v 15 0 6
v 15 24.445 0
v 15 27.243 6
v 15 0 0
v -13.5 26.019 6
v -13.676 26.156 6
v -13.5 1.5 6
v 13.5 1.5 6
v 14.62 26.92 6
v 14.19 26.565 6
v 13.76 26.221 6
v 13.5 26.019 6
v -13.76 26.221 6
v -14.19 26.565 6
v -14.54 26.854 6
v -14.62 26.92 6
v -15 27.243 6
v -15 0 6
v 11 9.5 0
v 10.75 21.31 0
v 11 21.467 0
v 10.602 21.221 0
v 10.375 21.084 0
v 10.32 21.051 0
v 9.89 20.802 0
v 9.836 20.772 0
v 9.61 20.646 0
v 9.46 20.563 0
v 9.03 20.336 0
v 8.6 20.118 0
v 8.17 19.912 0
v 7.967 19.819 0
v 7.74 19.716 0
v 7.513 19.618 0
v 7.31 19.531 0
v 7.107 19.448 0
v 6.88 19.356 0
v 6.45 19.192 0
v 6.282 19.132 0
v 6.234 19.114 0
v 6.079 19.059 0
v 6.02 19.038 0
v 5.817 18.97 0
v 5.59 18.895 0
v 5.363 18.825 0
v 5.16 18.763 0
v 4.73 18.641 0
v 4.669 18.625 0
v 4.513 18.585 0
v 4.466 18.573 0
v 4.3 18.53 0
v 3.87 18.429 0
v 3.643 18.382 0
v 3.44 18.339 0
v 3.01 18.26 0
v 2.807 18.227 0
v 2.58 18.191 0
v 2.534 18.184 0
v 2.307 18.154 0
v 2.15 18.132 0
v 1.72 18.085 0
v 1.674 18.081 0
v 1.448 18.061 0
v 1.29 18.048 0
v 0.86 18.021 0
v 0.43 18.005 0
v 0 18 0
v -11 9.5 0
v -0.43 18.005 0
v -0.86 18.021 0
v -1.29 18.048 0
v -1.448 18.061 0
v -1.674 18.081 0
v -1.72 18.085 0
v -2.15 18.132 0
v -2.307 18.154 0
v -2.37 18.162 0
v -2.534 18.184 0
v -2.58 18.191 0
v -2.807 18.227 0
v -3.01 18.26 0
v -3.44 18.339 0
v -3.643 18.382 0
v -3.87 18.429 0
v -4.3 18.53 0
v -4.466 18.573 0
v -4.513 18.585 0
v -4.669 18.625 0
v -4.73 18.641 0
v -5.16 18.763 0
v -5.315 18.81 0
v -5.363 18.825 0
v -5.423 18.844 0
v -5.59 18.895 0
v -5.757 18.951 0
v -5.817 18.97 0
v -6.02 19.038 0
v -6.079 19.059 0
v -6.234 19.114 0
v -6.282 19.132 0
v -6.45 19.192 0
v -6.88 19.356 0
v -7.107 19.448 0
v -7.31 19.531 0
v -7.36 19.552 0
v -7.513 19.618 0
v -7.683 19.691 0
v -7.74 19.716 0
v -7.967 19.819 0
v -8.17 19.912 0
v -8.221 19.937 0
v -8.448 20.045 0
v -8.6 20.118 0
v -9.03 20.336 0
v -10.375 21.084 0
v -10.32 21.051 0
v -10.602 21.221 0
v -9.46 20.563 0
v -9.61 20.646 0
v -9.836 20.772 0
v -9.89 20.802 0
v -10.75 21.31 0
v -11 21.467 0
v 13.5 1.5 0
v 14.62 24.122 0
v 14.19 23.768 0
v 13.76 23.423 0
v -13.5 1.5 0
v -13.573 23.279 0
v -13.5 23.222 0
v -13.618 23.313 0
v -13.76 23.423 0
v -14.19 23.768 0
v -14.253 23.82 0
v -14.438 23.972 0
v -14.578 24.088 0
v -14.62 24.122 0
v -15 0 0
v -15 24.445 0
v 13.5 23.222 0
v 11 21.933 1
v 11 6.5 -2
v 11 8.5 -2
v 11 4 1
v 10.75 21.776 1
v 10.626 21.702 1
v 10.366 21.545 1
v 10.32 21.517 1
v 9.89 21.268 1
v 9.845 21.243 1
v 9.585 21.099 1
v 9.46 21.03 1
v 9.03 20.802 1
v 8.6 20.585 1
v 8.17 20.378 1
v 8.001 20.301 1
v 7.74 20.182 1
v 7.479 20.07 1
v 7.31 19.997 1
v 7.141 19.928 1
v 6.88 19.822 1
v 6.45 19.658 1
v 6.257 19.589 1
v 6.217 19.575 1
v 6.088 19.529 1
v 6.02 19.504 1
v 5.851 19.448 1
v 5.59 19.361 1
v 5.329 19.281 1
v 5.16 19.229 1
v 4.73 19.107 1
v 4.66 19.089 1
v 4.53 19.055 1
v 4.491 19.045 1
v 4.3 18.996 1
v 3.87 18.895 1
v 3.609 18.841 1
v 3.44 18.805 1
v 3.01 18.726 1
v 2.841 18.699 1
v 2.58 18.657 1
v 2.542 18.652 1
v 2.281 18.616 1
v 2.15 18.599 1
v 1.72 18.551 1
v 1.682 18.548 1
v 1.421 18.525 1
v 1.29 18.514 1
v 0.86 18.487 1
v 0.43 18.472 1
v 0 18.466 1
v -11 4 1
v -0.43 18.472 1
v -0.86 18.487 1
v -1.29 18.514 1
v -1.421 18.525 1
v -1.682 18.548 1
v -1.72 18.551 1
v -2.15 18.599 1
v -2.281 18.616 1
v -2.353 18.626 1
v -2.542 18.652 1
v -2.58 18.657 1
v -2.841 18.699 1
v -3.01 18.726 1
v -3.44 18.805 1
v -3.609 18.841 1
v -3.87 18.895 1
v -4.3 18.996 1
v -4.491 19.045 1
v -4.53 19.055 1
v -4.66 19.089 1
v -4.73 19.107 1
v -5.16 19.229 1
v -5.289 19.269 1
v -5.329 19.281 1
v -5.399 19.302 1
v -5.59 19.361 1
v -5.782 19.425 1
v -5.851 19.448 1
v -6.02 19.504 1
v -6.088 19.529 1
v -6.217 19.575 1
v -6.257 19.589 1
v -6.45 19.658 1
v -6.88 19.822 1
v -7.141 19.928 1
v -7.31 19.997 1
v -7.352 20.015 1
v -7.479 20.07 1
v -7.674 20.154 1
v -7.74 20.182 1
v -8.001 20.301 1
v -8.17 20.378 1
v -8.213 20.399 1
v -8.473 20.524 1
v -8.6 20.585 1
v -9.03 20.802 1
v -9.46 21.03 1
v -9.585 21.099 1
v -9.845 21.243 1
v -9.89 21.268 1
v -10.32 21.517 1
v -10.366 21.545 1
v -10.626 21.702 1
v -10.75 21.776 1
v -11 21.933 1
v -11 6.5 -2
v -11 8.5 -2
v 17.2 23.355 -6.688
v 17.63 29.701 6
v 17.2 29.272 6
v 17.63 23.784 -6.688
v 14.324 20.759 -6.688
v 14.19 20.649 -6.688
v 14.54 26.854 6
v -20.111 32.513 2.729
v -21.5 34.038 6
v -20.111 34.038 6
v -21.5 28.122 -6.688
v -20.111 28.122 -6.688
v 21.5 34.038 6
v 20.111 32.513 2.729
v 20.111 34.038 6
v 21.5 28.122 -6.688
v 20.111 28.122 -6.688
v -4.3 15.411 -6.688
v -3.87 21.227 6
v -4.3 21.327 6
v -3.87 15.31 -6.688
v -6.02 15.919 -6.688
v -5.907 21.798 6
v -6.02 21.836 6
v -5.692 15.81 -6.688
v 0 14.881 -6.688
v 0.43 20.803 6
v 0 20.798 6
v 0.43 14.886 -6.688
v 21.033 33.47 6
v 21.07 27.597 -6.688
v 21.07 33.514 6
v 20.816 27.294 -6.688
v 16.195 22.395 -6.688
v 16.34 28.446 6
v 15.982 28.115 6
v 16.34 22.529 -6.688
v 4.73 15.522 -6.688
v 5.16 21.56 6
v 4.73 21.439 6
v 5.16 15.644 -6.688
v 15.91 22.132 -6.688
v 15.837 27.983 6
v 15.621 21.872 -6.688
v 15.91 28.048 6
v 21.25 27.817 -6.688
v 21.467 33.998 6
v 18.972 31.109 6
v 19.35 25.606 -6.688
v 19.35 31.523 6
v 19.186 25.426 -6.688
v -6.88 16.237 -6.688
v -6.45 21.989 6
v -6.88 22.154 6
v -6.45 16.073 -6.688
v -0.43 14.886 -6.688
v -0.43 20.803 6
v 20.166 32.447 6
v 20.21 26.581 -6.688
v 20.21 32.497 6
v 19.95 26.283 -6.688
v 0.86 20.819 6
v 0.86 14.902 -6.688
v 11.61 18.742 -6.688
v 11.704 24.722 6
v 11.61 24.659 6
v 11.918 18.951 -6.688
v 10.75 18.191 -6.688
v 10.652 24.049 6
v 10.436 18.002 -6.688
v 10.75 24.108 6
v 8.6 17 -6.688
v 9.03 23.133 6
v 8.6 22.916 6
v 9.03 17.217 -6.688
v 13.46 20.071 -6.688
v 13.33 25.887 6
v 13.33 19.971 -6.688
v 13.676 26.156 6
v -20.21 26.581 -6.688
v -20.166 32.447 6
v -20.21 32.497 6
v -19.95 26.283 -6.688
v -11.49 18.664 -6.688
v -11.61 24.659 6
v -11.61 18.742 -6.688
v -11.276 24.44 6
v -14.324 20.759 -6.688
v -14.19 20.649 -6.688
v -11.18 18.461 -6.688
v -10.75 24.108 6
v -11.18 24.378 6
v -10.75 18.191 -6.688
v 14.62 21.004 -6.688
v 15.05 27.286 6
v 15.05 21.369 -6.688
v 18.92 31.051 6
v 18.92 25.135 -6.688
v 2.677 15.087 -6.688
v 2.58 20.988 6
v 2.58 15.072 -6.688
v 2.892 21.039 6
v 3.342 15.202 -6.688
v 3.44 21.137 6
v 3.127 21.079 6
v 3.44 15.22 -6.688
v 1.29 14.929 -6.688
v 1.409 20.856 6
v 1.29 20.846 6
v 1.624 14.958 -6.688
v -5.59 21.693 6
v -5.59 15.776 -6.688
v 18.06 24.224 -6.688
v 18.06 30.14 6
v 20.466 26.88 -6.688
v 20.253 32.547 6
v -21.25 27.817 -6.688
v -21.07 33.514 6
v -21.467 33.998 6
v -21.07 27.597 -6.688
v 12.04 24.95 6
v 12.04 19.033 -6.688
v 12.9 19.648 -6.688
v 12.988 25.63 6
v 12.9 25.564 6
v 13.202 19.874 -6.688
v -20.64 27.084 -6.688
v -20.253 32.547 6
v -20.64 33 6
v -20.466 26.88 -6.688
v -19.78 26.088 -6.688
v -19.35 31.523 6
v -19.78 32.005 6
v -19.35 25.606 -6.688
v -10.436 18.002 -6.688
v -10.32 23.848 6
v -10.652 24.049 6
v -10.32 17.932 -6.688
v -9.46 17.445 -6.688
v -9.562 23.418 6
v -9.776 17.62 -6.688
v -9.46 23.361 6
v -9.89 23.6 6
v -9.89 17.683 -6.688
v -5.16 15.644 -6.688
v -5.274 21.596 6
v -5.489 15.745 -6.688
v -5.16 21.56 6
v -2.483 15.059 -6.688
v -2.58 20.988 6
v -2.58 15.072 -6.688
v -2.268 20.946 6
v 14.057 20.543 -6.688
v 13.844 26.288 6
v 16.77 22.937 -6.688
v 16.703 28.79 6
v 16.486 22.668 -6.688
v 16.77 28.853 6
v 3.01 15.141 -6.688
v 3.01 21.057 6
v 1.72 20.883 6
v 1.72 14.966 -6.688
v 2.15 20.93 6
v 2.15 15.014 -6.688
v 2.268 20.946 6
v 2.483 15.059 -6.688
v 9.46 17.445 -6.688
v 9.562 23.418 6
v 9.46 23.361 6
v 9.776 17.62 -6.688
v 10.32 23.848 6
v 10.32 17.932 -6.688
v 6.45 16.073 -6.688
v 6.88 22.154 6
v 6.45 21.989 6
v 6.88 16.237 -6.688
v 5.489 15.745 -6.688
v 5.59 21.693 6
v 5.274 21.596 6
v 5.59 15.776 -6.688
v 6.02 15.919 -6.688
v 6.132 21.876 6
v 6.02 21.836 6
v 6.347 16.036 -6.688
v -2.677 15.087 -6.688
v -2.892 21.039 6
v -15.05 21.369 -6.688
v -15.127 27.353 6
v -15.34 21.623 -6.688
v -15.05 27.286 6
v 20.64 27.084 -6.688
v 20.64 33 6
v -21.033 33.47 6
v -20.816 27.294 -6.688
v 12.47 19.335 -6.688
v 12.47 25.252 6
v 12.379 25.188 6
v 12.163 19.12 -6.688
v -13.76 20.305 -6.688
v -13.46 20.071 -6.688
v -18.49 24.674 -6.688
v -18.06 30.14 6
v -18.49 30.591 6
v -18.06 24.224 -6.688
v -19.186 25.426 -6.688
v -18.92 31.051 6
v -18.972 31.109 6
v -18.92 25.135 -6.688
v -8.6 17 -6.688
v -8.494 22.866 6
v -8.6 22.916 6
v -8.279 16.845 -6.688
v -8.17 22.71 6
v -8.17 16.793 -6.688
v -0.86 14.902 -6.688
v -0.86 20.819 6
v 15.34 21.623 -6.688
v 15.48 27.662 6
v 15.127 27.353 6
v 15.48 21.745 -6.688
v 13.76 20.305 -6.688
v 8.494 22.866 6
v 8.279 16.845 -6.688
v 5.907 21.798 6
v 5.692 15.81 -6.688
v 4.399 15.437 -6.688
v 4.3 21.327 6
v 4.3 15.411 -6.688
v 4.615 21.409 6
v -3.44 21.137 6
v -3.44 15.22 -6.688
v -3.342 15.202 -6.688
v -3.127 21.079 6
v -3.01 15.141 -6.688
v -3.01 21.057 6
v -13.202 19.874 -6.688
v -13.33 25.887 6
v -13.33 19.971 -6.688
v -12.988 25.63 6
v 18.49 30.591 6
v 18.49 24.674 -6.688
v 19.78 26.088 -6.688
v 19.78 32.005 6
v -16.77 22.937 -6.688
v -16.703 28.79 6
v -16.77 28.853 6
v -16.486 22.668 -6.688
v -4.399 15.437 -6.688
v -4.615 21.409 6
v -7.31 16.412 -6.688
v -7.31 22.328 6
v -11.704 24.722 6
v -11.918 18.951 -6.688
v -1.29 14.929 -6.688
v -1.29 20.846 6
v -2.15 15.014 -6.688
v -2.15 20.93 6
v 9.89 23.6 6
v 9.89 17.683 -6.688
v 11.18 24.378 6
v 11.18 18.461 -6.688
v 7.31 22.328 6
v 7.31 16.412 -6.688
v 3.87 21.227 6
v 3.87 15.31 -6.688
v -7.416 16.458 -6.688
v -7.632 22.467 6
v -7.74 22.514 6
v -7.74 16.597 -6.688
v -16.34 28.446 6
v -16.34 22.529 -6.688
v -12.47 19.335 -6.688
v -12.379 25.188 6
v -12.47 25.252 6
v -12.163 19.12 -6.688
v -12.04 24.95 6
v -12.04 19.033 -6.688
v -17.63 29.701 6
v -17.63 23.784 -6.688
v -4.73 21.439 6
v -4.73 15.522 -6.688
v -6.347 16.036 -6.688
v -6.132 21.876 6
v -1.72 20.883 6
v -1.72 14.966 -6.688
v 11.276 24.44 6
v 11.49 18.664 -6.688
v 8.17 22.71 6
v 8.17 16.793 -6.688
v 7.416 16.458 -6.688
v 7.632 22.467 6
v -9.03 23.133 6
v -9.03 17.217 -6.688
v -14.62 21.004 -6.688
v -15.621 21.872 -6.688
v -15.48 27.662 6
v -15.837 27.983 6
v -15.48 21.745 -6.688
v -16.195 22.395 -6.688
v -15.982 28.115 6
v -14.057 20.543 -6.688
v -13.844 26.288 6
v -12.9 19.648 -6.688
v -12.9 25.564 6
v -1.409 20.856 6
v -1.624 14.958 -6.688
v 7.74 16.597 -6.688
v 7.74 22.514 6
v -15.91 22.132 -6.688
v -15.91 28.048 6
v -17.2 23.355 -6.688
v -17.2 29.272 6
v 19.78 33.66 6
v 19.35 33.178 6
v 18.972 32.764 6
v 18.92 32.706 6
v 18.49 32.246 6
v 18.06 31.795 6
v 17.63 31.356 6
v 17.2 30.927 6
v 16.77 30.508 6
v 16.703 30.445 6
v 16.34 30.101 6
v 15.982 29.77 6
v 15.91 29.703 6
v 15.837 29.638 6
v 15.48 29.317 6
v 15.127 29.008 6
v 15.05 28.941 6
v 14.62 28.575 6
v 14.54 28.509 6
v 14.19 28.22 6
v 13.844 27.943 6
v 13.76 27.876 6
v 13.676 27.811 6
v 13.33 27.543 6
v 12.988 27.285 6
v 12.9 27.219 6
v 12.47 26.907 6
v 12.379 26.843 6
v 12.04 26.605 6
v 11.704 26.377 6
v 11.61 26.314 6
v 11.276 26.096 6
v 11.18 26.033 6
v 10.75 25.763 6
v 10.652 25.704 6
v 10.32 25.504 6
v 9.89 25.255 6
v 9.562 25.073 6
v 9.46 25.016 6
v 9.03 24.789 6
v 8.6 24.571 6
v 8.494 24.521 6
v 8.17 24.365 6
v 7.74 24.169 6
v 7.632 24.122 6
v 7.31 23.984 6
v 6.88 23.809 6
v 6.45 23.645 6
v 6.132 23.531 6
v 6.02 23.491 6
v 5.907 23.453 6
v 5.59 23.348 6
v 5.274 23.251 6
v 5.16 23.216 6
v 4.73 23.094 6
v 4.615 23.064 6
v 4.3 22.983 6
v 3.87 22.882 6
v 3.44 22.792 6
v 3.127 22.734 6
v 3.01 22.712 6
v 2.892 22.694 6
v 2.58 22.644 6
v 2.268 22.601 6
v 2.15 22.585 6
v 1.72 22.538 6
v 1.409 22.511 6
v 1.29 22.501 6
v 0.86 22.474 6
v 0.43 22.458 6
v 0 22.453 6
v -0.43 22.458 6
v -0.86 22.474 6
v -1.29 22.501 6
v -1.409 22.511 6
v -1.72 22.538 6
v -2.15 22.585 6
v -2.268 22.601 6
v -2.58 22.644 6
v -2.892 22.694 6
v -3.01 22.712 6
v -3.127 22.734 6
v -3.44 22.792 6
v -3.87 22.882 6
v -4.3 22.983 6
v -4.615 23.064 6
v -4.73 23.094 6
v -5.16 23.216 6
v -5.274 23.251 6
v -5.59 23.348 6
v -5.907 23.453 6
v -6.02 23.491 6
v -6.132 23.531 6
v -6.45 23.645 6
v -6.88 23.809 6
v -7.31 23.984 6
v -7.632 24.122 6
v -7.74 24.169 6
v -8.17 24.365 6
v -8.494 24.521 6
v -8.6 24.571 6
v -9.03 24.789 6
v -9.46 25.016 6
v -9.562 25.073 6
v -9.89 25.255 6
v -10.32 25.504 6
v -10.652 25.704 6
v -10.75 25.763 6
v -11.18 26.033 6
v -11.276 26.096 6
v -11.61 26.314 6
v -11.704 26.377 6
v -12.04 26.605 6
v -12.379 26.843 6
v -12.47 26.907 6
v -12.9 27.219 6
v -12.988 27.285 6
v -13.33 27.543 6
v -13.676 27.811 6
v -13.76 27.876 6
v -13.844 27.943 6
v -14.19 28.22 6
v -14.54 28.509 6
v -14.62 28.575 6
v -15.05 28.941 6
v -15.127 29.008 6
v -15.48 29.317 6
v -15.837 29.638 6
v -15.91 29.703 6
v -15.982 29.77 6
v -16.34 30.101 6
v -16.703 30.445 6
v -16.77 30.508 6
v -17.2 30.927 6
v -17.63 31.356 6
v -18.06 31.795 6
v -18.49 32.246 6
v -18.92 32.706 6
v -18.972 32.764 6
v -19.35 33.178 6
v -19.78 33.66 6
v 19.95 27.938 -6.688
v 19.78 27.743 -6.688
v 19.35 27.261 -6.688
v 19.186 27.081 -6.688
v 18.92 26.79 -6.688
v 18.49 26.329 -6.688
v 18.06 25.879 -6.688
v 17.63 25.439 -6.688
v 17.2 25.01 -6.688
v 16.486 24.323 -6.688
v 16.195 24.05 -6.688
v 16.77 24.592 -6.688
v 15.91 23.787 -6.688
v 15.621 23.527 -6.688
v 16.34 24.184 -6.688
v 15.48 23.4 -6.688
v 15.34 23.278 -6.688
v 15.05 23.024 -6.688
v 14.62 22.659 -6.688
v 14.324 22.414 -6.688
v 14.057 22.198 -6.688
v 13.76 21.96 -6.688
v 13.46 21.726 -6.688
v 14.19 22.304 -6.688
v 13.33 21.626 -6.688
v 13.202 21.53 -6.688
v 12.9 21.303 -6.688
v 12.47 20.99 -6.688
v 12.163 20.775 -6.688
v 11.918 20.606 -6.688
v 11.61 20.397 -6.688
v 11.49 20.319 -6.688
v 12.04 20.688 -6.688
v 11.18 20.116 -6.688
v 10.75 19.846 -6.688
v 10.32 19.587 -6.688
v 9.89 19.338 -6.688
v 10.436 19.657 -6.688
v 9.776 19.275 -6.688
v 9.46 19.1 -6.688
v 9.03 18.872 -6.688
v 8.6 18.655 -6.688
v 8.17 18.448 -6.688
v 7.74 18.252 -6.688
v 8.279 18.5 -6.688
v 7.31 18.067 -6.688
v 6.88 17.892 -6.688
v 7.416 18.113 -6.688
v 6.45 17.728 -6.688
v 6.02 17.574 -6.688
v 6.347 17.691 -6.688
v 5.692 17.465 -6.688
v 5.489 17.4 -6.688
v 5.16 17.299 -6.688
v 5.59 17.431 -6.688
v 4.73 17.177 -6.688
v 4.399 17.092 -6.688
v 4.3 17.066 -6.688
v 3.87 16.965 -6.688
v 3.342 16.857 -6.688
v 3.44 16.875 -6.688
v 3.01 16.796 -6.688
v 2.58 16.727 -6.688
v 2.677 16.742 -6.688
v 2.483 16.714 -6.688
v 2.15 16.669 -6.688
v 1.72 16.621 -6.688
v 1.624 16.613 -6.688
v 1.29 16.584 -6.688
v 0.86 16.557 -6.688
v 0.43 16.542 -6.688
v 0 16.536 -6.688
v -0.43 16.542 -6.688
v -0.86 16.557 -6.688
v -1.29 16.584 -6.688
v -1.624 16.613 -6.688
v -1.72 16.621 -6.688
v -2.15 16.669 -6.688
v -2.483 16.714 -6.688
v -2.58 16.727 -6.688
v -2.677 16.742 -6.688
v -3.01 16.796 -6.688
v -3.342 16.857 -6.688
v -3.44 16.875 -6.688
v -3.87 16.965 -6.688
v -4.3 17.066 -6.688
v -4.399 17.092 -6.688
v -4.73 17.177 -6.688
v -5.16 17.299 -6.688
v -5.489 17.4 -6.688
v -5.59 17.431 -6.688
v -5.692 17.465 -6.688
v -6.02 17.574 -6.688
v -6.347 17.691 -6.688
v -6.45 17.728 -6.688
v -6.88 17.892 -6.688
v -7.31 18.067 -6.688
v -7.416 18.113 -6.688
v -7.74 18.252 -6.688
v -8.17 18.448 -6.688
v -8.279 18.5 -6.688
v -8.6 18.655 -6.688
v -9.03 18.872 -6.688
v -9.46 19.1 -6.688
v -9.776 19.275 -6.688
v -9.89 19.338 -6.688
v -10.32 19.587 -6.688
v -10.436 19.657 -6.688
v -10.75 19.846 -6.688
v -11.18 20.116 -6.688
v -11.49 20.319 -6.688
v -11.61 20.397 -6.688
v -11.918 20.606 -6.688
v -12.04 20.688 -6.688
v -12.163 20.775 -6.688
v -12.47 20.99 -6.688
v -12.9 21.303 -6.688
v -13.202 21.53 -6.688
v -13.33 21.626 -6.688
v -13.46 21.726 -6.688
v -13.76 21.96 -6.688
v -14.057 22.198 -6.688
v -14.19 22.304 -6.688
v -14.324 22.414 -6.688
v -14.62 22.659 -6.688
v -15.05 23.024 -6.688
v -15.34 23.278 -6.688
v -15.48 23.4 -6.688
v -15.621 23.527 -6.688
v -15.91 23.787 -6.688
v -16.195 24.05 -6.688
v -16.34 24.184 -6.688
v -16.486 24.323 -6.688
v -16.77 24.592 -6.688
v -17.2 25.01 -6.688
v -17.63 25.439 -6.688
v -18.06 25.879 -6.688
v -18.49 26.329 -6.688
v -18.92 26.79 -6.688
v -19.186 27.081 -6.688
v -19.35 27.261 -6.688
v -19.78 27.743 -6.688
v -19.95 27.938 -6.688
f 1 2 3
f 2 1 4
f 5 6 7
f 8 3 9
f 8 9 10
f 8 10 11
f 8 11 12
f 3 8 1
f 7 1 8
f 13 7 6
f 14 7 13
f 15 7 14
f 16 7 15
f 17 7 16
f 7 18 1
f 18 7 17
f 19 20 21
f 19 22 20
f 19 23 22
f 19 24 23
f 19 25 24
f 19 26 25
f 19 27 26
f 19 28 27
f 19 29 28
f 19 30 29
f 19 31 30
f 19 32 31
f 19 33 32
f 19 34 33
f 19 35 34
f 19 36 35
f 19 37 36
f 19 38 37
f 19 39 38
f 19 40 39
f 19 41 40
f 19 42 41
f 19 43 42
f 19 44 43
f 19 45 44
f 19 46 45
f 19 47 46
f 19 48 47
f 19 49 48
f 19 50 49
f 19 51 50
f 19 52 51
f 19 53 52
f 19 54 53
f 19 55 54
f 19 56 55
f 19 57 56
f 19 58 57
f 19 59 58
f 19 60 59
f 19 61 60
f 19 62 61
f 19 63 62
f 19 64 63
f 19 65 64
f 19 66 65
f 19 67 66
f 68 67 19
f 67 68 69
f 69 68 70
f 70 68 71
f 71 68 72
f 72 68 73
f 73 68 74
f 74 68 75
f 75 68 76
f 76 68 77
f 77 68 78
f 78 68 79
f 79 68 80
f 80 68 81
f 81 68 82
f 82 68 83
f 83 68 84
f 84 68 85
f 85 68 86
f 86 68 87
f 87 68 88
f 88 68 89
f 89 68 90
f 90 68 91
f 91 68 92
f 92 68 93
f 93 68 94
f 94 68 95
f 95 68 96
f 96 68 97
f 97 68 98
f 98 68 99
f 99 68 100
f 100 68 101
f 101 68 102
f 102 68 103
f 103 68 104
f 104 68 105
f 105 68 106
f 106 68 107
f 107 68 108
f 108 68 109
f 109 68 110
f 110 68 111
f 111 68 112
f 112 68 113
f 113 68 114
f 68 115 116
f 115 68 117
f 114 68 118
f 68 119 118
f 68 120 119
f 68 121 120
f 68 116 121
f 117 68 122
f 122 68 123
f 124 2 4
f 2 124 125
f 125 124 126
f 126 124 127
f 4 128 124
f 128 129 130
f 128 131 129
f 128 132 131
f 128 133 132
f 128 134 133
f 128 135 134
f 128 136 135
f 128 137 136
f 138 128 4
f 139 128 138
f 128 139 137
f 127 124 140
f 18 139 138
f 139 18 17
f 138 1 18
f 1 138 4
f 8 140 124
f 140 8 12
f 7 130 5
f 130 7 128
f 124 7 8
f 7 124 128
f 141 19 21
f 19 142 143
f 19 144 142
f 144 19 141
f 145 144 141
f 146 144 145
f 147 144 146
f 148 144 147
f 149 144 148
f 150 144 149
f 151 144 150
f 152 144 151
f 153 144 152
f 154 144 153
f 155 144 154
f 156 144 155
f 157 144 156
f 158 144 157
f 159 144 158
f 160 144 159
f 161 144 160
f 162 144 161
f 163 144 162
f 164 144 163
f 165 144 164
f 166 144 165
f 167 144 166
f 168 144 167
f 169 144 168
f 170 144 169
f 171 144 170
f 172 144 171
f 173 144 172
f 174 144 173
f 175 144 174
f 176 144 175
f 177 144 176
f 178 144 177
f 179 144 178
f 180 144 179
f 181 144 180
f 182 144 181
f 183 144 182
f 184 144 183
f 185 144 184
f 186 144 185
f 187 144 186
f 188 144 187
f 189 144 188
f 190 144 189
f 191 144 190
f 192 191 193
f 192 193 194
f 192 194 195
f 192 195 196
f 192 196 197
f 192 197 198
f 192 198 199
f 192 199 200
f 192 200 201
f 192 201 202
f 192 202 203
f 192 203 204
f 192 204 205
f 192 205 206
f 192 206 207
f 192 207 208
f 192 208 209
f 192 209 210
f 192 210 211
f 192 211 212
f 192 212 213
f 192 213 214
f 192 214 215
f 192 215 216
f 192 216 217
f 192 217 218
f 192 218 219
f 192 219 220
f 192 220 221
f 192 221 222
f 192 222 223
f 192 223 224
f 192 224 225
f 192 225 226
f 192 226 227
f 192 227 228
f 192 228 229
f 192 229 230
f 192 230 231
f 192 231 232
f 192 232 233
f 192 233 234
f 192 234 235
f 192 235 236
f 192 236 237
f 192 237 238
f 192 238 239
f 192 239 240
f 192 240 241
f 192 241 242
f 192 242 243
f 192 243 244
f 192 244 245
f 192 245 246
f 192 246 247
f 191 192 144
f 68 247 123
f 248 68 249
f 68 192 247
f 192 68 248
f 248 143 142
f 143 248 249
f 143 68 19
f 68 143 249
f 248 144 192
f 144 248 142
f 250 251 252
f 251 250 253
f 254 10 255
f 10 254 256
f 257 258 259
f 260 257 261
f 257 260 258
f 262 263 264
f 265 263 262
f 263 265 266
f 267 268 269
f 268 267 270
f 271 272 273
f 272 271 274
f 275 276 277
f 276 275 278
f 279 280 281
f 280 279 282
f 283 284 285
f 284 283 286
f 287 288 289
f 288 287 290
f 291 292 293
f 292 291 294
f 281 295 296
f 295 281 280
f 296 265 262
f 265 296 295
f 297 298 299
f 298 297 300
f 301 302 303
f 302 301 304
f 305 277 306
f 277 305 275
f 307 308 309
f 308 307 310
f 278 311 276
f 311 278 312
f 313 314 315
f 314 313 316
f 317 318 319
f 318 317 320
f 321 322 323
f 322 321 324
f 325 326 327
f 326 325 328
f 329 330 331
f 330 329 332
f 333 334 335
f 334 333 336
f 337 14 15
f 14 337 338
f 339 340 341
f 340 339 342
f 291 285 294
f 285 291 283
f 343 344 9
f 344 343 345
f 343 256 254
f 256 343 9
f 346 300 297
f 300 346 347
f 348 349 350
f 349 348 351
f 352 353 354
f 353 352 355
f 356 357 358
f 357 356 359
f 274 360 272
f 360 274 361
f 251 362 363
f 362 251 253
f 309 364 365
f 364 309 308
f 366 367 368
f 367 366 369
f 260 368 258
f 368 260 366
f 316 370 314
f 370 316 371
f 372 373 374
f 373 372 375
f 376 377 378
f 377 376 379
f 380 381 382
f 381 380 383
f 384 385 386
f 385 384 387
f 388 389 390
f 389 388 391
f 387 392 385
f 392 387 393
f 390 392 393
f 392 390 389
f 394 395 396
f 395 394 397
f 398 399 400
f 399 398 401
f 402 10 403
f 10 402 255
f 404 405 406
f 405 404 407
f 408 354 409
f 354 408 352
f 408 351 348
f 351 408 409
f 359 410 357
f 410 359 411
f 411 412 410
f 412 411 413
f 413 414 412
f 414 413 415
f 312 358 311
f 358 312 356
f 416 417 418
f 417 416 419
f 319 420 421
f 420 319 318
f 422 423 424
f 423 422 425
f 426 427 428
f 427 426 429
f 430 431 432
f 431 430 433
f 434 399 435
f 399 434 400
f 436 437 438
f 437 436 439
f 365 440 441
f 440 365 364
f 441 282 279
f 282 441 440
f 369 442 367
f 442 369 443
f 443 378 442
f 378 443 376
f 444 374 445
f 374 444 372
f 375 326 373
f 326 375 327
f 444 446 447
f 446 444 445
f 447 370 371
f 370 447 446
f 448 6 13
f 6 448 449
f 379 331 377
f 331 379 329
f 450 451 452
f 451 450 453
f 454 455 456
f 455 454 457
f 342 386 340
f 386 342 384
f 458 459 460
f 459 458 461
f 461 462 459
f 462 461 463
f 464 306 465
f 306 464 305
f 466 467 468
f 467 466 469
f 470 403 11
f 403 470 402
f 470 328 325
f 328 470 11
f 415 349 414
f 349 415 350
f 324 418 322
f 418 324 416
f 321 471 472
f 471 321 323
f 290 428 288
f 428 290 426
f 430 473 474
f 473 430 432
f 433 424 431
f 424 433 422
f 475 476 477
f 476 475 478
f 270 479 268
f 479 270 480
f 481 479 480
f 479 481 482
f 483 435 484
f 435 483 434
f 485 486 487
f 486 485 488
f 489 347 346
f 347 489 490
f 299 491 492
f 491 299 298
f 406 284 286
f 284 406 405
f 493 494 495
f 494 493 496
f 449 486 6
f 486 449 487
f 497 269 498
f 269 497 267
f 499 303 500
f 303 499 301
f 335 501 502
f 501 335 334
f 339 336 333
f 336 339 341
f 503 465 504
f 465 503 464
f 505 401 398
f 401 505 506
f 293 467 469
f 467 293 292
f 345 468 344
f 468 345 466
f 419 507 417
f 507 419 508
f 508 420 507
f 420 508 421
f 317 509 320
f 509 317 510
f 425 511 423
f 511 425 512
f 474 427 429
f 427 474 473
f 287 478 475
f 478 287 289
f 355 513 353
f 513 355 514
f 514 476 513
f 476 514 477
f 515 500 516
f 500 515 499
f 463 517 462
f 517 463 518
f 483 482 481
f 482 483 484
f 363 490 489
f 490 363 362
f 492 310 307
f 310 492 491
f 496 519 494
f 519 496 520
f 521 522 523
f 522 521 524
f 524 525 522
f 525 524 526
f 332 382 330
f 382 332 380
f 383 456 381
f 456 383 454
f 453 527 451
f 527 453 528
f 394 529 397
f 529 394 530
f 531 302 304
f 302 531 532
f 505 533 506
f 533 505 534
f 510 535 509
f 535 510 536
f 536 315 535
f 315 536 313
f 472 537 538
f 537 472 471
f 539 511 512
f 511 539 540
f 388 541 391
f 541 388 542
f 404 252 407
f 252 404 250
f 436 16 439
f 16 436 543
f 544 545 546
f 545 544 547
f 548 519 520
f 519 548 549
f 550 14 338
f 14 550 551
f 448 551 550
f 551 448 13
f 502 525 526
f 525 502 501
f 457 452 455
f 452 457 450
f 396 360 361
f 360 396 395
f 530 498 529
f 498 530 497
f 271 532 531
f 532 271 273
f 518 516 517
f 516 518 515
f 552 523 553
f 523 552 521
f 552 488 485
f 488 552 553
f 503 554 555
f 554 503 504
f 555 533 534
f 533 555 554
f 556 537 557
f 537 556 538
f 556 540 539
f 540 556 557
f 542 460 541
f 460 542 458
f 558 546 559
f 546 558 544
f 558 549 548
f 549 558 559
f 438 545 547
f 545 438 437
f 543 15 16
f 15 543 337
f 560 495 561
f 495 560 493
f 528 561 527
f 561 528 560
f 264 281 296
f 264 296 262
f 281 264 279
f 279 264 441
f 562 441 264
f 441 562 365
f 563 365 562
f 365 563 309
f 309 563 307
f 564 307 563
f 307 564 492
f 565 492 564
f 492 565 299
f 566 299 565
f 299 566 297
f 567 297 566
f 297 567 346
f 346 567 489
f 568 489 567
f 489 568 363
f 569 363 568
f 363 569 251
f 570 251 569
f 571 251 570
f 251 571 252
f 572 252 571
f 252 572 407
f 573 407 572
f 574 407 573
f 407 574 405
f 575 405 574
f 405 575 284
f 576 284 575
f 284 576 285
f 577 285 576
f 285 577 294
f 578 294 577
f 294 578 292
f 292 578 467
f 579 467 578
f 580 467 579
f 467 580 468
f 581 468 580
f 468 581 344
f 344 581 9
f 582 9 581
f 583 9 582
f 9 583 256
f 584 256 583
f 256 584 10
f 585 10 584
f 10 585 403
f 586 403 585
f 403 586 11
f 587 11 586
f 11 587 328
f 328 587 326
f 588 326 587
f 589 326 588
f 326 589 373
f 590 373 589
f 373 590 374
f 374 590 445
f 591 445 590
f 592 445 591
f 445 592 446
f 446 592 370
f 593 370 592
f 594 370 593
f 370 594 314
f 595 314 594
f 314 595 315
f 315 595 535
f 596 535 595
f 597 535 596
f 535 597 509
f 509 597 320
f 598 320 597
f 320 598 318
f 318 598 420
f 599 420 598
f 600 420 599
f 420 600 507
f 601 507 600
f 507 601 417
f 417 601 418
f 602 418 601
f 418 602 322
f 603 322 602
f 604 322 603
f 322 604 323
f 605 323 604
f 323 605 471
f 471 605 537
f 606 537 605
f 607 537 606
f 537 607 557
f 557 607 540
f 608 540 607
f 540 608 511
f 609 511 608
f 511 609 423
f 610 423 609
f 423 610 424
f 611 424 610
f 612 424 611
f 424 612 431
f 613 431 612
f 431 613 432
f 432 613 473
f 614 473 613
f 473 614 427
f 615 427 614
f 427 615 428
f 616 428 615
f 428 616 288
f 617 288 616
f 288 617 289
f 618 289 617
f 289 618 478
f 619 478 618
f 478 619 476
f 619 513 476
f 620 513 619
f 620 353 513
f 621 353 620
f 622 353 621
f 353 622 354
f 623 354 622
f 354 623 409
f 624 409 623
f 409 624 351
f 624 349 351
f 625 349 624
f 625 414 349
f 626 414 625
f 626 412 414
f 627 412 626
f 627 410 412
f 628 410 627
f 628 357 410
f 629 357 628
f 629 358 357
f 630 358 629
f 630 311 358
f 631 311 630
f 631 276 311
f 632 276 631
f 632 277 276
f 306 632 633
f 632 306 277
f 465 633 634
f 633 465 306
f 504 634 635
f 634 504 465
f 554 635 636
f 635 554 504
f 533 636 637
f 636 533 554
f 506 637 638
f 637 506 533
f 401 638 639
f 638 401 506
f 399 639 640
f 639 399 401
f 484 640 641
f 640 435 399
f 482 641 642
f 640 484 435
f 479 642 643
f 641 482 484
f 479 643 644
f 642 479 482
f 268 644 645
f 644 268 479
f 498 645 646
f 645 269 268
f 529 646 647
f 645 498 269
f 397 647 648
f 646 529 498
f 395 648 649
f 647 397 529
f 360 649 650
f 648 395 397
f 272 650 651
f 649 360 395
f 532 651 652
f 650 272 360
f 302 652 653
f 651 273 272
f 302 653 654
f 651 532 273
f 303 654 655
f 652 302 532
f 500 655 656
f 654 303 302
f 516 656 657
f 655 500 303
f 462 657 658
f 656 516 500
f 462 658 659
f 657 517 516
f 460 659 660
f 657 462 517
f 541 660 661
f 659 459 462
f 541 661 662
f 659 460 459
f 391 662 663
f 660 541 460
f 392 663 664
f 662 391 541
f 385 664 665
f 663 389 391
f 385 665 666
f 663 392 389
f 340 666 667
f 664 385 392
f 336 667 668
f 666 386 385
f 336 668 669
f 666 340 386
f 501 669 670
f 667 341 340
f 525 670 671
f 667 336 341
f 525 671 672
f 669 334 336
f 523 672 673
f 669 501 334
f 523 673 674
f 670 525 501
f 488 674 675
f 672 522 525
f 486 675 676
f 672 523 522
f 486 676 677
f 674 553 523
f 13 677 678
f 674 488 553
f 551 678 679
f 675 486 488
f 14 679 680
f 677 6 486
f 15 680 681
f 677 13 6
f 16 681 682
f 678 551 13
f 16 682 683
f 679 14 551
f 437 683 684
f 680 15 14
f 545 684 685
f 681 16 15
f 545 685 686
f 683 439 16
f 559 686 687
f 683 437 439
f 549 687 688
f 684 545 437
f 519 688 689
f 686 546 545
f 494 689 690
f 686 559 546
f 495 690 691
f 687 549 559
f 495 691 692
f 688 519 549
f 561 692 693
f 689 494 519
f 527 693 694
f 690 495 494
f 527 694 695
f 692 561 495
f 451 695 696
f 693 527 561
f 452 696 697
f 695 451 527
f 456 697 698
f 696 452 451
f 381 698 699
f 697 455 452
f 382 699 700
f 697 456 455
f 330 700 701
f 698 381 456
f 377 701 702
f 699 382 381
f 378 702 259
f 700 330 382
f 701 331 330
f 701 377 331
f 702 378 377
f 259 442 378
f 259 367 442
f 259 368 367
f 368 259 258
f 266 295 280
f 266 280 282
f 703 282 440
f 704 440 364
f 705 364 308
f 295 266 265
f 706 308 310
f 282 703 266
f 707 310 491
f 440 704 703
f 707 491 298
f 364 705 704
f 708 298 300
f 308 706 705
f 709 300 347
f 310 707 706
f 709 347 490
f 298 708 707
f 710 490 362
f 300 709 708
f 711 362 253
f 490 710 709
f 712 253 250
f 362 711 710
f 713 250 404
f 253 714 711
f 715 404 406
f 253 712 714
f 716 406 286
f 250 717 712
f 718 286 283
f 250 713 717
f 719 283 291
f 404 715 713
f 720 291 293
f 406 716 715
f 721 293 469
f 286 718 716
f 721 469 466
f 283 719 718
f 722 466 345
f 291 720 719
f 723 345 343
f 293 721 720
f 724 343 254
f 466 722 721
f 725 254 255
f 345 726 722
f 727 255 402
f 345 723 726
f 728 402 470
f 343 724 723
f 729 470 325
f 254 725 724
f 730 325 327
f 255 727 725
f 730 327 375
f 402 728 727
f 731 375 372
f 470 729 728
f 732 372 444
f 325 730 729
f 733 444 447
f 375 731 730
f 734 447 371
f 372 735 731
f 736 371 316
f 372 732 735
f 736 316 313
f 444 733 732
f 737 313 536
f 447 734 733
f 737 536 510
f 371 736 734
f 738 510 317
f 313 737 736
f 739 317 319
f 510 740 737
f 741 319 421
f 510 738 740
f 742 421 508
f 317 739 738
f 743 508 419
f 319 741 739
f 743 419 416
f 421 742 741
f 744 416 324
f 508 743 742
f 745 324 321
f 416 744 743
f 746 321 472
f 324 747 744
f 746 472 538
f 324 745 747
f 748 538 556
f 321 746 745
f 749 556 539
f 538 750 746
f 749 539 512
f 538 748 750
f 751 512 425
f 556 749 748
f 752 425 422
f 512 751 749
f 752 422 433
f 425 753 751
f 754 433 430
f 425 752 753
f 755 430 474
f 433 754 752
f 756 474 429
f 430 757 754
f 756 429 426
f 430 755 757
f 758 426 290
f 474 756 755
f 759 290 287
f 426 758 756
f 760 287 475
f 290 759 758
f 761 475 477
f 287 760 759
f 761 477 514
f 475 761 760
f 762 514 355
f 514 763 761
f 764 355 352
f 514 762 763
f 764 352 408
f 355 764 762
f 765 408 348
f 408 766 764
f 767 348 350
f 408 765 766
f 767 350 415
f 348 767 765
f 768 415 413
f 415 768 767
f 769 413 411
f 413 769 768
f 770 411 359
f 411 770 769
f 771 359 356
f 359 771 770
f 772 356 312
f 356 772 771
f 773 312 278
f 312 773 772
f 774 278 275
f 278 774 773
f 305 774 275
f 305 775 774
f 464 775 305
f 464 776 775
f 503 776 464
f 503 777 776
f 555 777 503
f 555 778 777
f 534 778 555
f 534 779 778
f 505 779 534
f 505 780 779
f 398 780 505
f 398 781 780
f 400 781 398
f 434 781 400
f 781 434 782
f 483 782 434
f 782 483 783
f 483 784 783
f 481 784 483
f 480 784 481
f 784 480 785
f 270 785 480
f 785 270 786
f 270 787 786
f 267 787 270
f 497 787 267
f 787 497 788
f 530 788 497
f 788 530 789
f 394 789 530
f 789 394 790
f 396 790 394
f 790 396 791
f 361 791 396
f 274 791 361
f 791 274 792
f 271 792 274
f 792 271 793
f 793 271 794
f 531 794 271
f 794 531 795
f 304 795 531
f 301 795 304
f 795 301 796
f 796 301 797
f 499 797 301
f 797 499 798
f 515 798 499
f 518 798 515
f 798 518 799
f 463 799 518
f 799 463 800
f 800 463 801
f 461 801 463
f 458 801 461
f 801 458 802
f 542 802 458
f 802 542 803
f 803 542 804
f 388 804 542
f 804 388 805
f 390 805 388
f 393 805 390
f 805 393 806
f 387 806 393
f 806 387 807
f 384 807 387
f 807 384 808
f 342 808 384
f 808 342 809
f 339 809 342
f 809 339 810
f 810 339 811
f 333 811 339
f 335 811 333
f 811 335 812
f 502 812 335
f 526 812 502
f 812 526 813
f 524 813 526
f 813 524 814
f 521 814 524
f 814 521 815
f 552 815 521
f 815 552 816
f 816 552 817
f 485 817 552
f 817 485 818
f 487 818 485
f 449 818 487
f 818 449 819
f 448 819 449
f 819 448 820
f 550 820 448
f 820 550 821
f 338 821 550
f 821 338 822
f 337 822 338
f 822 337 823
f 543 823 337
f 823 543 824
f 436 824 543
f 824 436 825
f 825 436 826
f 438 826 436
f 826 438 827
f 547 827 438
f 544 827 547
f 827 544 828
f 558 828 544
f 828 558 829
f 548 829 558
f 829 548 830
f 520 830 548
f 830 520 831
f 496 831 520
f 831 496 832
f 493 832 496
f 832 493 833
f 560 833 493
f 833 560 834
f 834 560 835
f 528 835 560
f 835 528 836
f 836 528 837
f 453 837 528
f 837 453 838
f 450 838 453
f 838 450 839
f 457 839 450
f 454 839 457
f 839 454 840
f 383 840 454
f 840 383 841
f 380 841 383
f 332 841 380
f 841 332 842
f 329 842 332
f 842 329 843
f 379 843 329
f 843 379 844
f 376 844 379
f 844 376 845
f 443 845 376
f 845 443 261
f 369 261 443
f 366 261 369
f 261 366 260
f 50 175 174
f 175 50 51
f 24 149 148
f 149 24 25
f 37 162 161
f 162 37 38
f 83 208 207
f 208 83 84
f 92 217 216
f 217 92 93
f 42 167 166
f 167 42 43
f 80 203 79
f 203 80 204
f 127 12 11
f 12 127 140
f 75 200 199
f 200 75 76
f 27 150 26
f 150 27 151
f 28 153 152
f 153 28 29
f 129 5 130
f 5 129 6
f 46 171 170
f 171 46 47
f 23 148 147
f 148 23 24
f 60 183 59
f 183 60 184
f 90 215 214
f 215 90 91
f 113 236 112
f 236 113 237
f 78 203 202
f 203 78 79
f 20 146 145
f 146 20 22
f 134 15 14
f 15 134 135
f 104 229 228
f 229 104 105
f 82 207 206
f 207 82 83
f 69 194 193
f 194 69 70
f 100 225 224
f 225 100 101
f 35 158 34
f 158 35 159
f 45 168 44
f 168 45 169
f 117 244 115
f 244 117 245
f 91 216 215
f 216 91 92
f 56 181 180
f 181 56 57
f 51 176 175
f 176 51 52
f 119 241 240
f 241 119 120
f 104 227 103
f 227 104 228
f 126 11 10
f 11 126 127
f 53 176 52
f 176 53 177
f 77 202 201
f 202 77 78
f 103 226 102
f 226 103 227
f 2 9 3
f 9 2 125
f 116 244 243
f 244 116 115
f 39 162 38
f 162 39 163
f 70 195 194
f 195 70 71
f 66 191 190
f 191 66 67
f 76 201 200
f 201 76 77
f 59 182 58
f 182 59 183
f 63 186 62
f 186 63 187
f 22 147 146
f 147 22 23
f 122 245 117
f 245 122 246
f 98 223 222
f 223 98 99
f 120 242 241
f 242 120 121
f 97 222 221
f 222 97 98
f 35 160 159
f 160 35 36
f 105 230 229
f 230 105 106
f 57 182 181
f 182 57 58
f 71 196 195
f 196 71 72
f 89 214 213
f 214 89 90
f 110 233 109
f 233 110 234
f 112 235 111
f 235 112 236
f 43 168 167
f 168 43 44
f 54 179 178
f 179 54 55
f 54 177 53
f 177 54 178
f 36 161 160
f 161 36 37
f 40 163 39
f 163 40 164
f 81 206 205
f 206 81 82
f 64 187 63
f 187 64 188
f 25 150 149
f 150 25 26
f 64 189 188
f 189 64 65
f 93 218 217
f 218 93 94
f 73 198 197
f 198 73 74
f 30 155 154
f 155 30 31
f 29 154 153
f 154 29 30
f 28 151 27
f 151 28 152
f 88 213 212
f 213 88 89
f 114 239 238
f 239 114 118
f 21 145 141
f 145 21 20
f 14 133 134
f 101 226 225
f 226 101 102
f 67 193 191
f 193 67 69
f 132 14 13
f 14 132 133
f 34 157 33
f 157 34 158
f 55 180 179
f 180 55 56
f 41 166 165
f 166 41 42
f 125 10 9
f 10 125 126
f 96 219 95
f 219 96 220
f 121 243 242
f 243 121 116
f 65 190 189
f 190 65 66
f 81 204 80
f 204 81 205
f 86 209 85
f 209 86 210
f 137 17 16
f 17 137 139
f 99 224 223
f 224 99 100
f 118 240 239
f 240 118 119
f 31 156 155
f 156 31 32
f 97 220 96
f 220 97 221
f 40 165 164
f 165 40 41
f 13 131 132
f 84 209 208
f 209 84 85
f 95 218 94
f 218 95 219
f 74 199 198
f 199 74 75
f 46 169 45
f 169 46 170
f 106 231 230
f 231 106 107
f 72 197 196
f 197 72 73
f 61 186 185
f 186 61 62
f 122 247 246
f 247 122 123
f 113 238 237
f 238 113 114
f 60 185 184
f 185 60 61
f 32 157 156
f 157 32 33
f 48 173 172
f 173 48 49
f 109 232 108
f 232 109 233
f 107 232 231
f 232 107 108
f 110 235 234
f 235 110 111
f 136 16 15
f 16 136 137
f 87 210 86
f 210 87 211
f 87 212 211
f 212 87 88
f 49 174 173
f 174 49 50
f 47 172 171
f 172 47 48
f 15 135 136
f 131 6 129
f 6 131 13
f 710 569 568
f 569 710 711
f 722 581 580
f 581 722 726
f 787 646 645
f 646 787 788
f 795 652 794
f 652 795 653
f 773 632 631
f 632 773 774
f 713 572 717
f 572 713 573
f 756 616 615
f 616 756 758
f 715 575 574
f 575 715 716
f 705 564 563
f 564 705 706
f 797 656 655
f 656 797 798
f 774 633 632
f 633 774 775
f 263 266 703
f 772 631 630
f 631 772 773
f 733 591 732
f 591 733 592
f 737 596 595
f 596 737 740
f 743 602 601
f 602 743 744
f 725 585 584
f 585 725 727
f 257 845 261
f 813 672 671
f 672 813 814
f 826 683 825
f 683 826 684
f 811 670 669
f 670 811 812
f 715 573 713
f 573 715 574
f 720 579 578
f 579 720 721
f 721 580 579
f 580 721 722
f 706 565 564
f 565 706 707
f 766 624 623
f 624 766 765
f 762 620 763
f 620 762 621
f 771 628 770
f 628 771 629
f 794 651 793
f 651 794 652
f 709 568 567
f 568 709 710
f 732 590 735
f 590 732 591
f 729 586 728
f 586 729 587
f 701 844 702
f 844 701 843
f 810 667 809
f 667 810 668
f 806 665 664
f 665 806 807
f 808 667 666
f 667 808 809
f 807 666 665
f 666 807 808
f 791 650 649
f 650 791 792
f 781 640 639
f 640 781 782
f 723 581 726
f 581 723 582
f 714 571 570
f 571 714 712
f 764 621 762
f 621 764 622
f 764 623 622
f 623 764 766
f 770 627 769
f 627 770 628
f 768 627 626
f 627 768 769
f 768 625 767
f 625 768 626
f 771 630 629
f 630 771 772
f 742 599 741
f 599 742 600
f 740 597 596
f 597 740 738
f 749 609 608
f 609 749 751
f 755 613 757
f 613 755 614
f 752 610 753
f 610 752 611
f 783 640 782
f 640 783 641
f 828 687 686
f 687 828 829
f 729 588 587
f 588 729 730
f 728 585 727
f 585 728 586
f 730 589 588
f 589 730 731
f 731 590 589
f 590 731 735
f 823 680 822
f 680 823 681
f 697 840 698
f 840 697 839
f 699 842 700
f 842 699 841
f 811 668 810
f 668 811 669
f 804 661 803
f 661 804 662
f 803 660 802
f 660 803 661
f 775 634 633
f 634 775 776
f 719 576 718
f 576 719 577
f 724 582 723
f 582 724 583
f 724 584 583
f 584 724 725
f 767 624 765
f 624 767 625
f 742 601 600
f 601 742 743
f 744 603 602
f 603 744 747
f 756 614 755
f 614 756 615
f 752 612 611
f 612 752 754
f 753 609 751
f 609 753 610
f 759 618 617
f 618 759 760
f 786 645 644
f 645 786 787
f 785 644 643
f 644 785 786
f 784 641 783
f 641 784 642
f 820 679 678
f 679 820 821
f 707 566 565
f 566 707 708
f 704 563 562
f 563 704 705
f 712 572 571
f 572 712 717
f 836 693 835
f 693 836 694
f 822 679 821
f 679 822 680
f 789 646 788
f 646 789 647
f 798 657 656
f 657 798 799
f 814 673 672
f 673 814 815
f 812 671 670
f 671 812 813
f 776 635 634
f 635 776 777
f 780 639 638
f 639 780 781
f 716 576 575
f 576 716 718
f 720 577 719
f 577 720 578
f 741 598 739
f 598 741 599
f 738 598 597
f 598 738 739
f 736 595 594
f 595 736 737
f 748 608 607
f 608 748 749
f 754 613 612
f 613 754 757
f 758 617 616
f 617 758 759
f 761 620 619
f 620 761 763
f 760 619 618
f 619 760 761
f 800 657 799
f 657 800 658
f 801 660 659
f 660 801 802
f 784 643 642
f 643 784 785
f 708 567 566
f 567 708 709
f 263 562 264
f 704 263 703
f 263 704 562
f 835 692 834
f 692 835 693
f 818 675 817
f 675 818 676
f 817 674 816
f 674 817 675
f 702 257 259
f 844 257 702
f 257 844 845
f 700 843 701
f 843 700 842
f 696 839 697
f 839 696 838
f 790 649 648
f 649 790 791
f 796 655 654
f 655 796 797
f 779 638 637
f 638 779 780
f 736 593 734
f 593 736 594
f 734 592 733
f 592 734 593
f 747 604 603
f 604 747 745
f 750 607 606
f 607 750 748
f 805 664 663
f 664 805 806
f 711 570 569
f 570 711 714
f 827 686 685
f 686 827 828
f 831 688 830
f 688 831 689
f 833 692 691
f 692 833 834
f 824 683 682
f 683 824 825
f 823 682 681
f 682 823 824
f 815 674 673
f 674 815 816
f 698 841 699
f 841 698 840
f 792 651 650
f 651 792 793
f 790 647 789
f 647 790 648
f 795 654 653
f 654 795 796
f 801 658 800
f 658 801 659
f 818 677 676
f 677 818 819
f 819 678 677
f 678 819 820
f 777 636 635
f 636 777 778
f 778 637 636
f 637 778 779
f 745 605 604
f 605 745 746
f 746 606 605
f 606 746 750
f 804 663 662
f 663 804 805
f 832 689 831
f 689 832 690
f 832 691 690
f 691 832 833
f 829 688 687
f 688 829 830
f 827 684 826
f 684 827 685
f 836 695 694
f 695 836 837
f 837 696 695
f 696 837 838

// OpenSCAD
// file: parabolic_cylinder.scad
module parabolic_cylinder(width, height, depth) {
    // a * (width / 2)^2 = height
    a = 4 * height / (width * width);

    function f(x) = a * x * x;

    // autogenerated with:
    // val lines = (-50 to 50) map {
    //   x: Int => "[width / 100 * " + x + ", f(width / 100 * " + x + ")]"
    // }
    // println (lines.mkString(",\n            "))

    translate([0,0,-depth])
    linear_extrude(depth * 2) {
        polygon([
            [width / 100 * -50, f(width / 100 * -50)],
            [width / 100 * -49, f(width / 100 * -49)],
            [width / 100 * -48, f(width / 100 * -48)],
            [width / 100 * -47, f(width / 100 * -47)],
            [width / 100 * -46, f(width / 100 * -46)],
            [width / 100 * -45, f(width / 100 * -45)],
            [width / 100 * -44, f(width / 100 * -44)],
            [width / 100 * -43, f(width / 100 * -43)],
            [width / 100 * -42, f(width / 100 * -42)],
            [width / 100 * -41, f(width / 100 * -41)],
            [width / 100 * -40, f(width / 100 * -40)],
            [width / 100 * -39, f(width / 100 * -39)],
            [width / 100 * -38, f(width / 100 * -38)],
            [width / 100 * -37, f(width / 100 * -37)],
            [width / 100 * -36, f(width / 100 * -36)],
            [width / 100 * -35, f(width / 100 * -35)],
            [width / 100 * -34, f(width / 100 * -34)],
            [width / 100 * -33, f(width / 100 * -33)],
            [width / 100 * -32, f(width / 100 * -32)],
            [width / 100 * -31, f(width / 100 * -31)],
            [width / 100 * -30, f(width / 100 * -30)],
            [width / 100 * -29, f(width / 100 * -29)],
            [width / 100 * -28, f(width / 100 * -28)],
            [width / 100 * -27, f(width / 100 * -27)],
            [width / 100 * -26, f(width / 100 * -26)],
            [width / 100 * -25, f(width / 100 * -25)],
            [width / 100 * -24, f(width / 100 * -24)],
            [width / 100 * -23, f(width / 100 * -23)],
            [width / 100 * -22, f(width / 100 * -22)],
            [width / 100 * -21, f(width / 100 * -21)],
            [width / 100 * -20, f(width / 100 * -20)],
            [width / 100 * -19, f(width / 100 * -19)],
            [width / 100 * -18, f(width / 100 * -18)],
            [width / 100 * -17, f(width / 100 * -17)],
            [width / 100 * -16, f(width / 100 * -16)],
            [width / 100 * -15, f(width / 100 * -15)],
            [width / 100 * -14, f(width / 100 * -14)],
            [width / 100 * -13, f(width / 100 * -13)],
            [width / 100 * -12, f(width / 100 * -12)],
            [width / 100 * -11, f(width / 100 * -11)],
            [width / 100 * -10, f(width / 100 * -10)],
            [width / 100 * -9, f(width / 100 * -9)],
            [width / 100 * -8, f(width / 100 * -8)],
            [width / 100 * -7, f(width / 100 * -7)],
            [width / 100 * -6, f(width / 100 * -6)],
            [width / 100 * -5, f(width / 100 * -5)],
            [width / 100 * -4, f(width / 100 * -4)],
            [width / 100 * -3, f(width / 100 * -3)],
            [width / 100 * -2, f(width / 100 * -2)],
            [width / 100 * -1, f(width / 100 * -1)],
            [width / 100 * 0, f(width / 100 * 0)],
            [width / 100 * 1, f(width / 100 * 1)],
            [width / 100 * 2, f(width / 100 * 2)],
            [width / 100 * 3, f(width / 100 * 3)],
            [width / 100 * 4, f(width / 100 * 4)],
            [width / 100 * 5, f(width / 100 * 5)],
            [width / 100 * 6, f(width / 100 * 6)],
            [width / 100 * 7, f(width / 100 * 7)],
            [width / 100 * 8, f(width / 100 * 8)],
            [width / 100 * 9, f(width / 100 * 9)],
            [width / 100 * 10, f(width / 100 * 10)],
            [width / 100 * 11, f(width / 100 * 11)],
            [width / 100 * 12, f(width / 100 * 12)],
            [width / 100 * 13, f(width / 100 * 13)],
            [width / 100 * 14, f(width / 100 * 14)],
            [width / 100 * 15, f(width / 100 * 15)],
            [width / 100 * 16, f(width / 100 * 16)],
            [width / 100 * 17, f(width / 100 * 17)],
            [width / 100 * 18, f(width / 100 * 18)],
            [width / 100 * 19, f(width / 100 * 19)],
            [width / 100 * 20, f(width / 100 * 20)],
            [width / 100 * 21, f(width / 100 * 21)],
            [width / 100 * 22, f(width / 100 * 22)],
            [width / 100 * 23, f(width / 100 * 23)],
            [width / 100 * 24, f(width / 100 * 24)],
            [width / 100 * 25, f(width / 100 * 25)],
            [width / 100 * 26, f(width / 100 * 26)],
            [width / 100 * 27, f(width / 100 * 27)],
            [width / 100 * 28, f(width / 100 * 28)],
            [width / 100 * 29, f(width / 100 * 29)],
            [width / 100 * 30, f(width / 100 * 30)],
            [width / 100 * 31, f(width / 100 * 31)],
            [width / 100 * 32, f(width / 100 * 32)],
            [width / 100 * 33, f(width / 100 * 33)],
            [width / 100 * 34, f(width / 100 * 34)],
            [width / 100 * 35, f(width / 100 * 35)],
            [width / 100 * 36, f(width / 100 * 36)],
            [width / 100 * 37, f(width / 100 * 37)],
            [width / 100 * 38, f(width / 100 * 38)],
            [width / 100 * 39, f(width / 100 * 39)],
            [width / 100 * 40, f(width / 100 * 40)],
            [width / 100 * 41, f(width / 100 * 41)],
            [width / 100 * 42, f(width / 100 * 42)],
            [width / 100 * 43, f(width / 100 * 43)],
            [width / 100 * 44, f(width / 100 * 44)],
            [width / 100 * 45, f(width / 100 * 45)],
            [width / 100 * 46, f(width / 100 * 46)],
            [width / 100 * 47, f(width / 100 * 47)],
            [width / 100 * 48, f(width / 100 * 48)],
            [width / 100 * 49, f(width / 100 * 49)],
            [width / 100 * 50, f(width / 100 * 50)]
        ]);
    }
}
// main file
/* fizik ics clip */

use <parabolic_cylinder.scad>;

module fizik_ics() {
    width = 30.0;
    min_depth = 18.0;
    max_depth = min_depth * 1.8;
    height = 6.0;

    wall_thickness = 1.5;

    clip_width = 22;
    clip_thickness = 1.0;

    /*
     *             b
     *            ___
     *         a /   \ c
     *          /     \
     *  -------/       \
     *  -----------------
     */

    clip_protrusion = 2.0;
    clip_length_a = 1.0;
    clip_length_b = 2.0;
    clip_length_c = 2.5;

    // distance from the clip to the inside of the frame wall
    clip_separation = 2.5;

    module frame() {
        // outer frame
        difference() {
            cube([width, max_depth, height]);
            translate([wall_thickness, wall_thickness, 0]) {
                cube([width - 2 * wall_thickness, max_depth - 2 * wall_thickness, height * 2]);
            }
        }
    }

    module clip() {
        width_space = (width - clip_width - 2 * wall_thickness) / 2;

        x_shift = wall_thickness + width_space;
        y_shift = wall_thickness + clip_separation;
        translate([x_shift, y_shift, 0]) {
            union() {
                // Remove the part that conflicts with the ramp
                difference() {
                    cube([clip_width, max_depth - y_shift, clip_thickness]);
                    cube([clip_width, clip_length_a + clip_length_b + clip_length_c, clip_thickness]);
                };

                rotate([90, 0, 0])
                rotate([0, 90, 0])
                linear_extrude(clip_width) {
                    polygon([
                        [0, clip_thickness],
                        [clip_length_c, -clip_protrusion],
                        [clip_length_c + clip_length_b, -clip_protrusion],
                        [clip_length_c + clip_length_b + clip_length_a, 0 ],
                        [clip_length_c + clip_length_b + clip_length_a, clip_thickness],
                    ]);
                };
            }
        }
    }

    // width/depth are post-rotate, height is pre-rotate
    stop_angle = 25.0;
    stop_width = 43.0;
    stop_depth = 12.0;
    stop_height = 14.0;


    module stop_mask(sh = stop_height) {
        // FIXME: Make this an extrude of the actual shape
        vertical_height = cos(stop_angle) * sh;
        translate([(width - stop_width) / 2, 0, height-vertical_height]) {
            cube([stop_width, max_depth * 2, vertical_height]);
        }
    }

    module stop_solid(sh = stop_height) {
        // Model the end as a tilted paraboloid
        intersection() {
            translate([width / 2, min_depth - height * tan(stop_angle), -height])
            rotate([-stop_angle, 0, 0])
            translate([0,0,sh/2])
            parabolic_cylinder(stop_width, stop_depth, sh);
            stop_mask(sh);
        }
    }

    module stop(sh = stop_height, wt = wall_thickness) {
        difference() {
            stop_solid(stop_height);
            translate([0, wt / cos(stop_angle) , 0]) {
                stop_solid(stop_height);
            }
        }
    }

    translate([-width/2, 0, 0])
    union() {
        difference() {
            union() {
                frame();
                clip();
            }

            // mask off the end
            hull() {
                stop_solid(stop_height);
                translate([0, max_depth, 0]) {
                    cube([width, 1, height]);
                }
            }
        }

        stop(stop_height, wall_thickness);
    }
}

fizik_ics();
